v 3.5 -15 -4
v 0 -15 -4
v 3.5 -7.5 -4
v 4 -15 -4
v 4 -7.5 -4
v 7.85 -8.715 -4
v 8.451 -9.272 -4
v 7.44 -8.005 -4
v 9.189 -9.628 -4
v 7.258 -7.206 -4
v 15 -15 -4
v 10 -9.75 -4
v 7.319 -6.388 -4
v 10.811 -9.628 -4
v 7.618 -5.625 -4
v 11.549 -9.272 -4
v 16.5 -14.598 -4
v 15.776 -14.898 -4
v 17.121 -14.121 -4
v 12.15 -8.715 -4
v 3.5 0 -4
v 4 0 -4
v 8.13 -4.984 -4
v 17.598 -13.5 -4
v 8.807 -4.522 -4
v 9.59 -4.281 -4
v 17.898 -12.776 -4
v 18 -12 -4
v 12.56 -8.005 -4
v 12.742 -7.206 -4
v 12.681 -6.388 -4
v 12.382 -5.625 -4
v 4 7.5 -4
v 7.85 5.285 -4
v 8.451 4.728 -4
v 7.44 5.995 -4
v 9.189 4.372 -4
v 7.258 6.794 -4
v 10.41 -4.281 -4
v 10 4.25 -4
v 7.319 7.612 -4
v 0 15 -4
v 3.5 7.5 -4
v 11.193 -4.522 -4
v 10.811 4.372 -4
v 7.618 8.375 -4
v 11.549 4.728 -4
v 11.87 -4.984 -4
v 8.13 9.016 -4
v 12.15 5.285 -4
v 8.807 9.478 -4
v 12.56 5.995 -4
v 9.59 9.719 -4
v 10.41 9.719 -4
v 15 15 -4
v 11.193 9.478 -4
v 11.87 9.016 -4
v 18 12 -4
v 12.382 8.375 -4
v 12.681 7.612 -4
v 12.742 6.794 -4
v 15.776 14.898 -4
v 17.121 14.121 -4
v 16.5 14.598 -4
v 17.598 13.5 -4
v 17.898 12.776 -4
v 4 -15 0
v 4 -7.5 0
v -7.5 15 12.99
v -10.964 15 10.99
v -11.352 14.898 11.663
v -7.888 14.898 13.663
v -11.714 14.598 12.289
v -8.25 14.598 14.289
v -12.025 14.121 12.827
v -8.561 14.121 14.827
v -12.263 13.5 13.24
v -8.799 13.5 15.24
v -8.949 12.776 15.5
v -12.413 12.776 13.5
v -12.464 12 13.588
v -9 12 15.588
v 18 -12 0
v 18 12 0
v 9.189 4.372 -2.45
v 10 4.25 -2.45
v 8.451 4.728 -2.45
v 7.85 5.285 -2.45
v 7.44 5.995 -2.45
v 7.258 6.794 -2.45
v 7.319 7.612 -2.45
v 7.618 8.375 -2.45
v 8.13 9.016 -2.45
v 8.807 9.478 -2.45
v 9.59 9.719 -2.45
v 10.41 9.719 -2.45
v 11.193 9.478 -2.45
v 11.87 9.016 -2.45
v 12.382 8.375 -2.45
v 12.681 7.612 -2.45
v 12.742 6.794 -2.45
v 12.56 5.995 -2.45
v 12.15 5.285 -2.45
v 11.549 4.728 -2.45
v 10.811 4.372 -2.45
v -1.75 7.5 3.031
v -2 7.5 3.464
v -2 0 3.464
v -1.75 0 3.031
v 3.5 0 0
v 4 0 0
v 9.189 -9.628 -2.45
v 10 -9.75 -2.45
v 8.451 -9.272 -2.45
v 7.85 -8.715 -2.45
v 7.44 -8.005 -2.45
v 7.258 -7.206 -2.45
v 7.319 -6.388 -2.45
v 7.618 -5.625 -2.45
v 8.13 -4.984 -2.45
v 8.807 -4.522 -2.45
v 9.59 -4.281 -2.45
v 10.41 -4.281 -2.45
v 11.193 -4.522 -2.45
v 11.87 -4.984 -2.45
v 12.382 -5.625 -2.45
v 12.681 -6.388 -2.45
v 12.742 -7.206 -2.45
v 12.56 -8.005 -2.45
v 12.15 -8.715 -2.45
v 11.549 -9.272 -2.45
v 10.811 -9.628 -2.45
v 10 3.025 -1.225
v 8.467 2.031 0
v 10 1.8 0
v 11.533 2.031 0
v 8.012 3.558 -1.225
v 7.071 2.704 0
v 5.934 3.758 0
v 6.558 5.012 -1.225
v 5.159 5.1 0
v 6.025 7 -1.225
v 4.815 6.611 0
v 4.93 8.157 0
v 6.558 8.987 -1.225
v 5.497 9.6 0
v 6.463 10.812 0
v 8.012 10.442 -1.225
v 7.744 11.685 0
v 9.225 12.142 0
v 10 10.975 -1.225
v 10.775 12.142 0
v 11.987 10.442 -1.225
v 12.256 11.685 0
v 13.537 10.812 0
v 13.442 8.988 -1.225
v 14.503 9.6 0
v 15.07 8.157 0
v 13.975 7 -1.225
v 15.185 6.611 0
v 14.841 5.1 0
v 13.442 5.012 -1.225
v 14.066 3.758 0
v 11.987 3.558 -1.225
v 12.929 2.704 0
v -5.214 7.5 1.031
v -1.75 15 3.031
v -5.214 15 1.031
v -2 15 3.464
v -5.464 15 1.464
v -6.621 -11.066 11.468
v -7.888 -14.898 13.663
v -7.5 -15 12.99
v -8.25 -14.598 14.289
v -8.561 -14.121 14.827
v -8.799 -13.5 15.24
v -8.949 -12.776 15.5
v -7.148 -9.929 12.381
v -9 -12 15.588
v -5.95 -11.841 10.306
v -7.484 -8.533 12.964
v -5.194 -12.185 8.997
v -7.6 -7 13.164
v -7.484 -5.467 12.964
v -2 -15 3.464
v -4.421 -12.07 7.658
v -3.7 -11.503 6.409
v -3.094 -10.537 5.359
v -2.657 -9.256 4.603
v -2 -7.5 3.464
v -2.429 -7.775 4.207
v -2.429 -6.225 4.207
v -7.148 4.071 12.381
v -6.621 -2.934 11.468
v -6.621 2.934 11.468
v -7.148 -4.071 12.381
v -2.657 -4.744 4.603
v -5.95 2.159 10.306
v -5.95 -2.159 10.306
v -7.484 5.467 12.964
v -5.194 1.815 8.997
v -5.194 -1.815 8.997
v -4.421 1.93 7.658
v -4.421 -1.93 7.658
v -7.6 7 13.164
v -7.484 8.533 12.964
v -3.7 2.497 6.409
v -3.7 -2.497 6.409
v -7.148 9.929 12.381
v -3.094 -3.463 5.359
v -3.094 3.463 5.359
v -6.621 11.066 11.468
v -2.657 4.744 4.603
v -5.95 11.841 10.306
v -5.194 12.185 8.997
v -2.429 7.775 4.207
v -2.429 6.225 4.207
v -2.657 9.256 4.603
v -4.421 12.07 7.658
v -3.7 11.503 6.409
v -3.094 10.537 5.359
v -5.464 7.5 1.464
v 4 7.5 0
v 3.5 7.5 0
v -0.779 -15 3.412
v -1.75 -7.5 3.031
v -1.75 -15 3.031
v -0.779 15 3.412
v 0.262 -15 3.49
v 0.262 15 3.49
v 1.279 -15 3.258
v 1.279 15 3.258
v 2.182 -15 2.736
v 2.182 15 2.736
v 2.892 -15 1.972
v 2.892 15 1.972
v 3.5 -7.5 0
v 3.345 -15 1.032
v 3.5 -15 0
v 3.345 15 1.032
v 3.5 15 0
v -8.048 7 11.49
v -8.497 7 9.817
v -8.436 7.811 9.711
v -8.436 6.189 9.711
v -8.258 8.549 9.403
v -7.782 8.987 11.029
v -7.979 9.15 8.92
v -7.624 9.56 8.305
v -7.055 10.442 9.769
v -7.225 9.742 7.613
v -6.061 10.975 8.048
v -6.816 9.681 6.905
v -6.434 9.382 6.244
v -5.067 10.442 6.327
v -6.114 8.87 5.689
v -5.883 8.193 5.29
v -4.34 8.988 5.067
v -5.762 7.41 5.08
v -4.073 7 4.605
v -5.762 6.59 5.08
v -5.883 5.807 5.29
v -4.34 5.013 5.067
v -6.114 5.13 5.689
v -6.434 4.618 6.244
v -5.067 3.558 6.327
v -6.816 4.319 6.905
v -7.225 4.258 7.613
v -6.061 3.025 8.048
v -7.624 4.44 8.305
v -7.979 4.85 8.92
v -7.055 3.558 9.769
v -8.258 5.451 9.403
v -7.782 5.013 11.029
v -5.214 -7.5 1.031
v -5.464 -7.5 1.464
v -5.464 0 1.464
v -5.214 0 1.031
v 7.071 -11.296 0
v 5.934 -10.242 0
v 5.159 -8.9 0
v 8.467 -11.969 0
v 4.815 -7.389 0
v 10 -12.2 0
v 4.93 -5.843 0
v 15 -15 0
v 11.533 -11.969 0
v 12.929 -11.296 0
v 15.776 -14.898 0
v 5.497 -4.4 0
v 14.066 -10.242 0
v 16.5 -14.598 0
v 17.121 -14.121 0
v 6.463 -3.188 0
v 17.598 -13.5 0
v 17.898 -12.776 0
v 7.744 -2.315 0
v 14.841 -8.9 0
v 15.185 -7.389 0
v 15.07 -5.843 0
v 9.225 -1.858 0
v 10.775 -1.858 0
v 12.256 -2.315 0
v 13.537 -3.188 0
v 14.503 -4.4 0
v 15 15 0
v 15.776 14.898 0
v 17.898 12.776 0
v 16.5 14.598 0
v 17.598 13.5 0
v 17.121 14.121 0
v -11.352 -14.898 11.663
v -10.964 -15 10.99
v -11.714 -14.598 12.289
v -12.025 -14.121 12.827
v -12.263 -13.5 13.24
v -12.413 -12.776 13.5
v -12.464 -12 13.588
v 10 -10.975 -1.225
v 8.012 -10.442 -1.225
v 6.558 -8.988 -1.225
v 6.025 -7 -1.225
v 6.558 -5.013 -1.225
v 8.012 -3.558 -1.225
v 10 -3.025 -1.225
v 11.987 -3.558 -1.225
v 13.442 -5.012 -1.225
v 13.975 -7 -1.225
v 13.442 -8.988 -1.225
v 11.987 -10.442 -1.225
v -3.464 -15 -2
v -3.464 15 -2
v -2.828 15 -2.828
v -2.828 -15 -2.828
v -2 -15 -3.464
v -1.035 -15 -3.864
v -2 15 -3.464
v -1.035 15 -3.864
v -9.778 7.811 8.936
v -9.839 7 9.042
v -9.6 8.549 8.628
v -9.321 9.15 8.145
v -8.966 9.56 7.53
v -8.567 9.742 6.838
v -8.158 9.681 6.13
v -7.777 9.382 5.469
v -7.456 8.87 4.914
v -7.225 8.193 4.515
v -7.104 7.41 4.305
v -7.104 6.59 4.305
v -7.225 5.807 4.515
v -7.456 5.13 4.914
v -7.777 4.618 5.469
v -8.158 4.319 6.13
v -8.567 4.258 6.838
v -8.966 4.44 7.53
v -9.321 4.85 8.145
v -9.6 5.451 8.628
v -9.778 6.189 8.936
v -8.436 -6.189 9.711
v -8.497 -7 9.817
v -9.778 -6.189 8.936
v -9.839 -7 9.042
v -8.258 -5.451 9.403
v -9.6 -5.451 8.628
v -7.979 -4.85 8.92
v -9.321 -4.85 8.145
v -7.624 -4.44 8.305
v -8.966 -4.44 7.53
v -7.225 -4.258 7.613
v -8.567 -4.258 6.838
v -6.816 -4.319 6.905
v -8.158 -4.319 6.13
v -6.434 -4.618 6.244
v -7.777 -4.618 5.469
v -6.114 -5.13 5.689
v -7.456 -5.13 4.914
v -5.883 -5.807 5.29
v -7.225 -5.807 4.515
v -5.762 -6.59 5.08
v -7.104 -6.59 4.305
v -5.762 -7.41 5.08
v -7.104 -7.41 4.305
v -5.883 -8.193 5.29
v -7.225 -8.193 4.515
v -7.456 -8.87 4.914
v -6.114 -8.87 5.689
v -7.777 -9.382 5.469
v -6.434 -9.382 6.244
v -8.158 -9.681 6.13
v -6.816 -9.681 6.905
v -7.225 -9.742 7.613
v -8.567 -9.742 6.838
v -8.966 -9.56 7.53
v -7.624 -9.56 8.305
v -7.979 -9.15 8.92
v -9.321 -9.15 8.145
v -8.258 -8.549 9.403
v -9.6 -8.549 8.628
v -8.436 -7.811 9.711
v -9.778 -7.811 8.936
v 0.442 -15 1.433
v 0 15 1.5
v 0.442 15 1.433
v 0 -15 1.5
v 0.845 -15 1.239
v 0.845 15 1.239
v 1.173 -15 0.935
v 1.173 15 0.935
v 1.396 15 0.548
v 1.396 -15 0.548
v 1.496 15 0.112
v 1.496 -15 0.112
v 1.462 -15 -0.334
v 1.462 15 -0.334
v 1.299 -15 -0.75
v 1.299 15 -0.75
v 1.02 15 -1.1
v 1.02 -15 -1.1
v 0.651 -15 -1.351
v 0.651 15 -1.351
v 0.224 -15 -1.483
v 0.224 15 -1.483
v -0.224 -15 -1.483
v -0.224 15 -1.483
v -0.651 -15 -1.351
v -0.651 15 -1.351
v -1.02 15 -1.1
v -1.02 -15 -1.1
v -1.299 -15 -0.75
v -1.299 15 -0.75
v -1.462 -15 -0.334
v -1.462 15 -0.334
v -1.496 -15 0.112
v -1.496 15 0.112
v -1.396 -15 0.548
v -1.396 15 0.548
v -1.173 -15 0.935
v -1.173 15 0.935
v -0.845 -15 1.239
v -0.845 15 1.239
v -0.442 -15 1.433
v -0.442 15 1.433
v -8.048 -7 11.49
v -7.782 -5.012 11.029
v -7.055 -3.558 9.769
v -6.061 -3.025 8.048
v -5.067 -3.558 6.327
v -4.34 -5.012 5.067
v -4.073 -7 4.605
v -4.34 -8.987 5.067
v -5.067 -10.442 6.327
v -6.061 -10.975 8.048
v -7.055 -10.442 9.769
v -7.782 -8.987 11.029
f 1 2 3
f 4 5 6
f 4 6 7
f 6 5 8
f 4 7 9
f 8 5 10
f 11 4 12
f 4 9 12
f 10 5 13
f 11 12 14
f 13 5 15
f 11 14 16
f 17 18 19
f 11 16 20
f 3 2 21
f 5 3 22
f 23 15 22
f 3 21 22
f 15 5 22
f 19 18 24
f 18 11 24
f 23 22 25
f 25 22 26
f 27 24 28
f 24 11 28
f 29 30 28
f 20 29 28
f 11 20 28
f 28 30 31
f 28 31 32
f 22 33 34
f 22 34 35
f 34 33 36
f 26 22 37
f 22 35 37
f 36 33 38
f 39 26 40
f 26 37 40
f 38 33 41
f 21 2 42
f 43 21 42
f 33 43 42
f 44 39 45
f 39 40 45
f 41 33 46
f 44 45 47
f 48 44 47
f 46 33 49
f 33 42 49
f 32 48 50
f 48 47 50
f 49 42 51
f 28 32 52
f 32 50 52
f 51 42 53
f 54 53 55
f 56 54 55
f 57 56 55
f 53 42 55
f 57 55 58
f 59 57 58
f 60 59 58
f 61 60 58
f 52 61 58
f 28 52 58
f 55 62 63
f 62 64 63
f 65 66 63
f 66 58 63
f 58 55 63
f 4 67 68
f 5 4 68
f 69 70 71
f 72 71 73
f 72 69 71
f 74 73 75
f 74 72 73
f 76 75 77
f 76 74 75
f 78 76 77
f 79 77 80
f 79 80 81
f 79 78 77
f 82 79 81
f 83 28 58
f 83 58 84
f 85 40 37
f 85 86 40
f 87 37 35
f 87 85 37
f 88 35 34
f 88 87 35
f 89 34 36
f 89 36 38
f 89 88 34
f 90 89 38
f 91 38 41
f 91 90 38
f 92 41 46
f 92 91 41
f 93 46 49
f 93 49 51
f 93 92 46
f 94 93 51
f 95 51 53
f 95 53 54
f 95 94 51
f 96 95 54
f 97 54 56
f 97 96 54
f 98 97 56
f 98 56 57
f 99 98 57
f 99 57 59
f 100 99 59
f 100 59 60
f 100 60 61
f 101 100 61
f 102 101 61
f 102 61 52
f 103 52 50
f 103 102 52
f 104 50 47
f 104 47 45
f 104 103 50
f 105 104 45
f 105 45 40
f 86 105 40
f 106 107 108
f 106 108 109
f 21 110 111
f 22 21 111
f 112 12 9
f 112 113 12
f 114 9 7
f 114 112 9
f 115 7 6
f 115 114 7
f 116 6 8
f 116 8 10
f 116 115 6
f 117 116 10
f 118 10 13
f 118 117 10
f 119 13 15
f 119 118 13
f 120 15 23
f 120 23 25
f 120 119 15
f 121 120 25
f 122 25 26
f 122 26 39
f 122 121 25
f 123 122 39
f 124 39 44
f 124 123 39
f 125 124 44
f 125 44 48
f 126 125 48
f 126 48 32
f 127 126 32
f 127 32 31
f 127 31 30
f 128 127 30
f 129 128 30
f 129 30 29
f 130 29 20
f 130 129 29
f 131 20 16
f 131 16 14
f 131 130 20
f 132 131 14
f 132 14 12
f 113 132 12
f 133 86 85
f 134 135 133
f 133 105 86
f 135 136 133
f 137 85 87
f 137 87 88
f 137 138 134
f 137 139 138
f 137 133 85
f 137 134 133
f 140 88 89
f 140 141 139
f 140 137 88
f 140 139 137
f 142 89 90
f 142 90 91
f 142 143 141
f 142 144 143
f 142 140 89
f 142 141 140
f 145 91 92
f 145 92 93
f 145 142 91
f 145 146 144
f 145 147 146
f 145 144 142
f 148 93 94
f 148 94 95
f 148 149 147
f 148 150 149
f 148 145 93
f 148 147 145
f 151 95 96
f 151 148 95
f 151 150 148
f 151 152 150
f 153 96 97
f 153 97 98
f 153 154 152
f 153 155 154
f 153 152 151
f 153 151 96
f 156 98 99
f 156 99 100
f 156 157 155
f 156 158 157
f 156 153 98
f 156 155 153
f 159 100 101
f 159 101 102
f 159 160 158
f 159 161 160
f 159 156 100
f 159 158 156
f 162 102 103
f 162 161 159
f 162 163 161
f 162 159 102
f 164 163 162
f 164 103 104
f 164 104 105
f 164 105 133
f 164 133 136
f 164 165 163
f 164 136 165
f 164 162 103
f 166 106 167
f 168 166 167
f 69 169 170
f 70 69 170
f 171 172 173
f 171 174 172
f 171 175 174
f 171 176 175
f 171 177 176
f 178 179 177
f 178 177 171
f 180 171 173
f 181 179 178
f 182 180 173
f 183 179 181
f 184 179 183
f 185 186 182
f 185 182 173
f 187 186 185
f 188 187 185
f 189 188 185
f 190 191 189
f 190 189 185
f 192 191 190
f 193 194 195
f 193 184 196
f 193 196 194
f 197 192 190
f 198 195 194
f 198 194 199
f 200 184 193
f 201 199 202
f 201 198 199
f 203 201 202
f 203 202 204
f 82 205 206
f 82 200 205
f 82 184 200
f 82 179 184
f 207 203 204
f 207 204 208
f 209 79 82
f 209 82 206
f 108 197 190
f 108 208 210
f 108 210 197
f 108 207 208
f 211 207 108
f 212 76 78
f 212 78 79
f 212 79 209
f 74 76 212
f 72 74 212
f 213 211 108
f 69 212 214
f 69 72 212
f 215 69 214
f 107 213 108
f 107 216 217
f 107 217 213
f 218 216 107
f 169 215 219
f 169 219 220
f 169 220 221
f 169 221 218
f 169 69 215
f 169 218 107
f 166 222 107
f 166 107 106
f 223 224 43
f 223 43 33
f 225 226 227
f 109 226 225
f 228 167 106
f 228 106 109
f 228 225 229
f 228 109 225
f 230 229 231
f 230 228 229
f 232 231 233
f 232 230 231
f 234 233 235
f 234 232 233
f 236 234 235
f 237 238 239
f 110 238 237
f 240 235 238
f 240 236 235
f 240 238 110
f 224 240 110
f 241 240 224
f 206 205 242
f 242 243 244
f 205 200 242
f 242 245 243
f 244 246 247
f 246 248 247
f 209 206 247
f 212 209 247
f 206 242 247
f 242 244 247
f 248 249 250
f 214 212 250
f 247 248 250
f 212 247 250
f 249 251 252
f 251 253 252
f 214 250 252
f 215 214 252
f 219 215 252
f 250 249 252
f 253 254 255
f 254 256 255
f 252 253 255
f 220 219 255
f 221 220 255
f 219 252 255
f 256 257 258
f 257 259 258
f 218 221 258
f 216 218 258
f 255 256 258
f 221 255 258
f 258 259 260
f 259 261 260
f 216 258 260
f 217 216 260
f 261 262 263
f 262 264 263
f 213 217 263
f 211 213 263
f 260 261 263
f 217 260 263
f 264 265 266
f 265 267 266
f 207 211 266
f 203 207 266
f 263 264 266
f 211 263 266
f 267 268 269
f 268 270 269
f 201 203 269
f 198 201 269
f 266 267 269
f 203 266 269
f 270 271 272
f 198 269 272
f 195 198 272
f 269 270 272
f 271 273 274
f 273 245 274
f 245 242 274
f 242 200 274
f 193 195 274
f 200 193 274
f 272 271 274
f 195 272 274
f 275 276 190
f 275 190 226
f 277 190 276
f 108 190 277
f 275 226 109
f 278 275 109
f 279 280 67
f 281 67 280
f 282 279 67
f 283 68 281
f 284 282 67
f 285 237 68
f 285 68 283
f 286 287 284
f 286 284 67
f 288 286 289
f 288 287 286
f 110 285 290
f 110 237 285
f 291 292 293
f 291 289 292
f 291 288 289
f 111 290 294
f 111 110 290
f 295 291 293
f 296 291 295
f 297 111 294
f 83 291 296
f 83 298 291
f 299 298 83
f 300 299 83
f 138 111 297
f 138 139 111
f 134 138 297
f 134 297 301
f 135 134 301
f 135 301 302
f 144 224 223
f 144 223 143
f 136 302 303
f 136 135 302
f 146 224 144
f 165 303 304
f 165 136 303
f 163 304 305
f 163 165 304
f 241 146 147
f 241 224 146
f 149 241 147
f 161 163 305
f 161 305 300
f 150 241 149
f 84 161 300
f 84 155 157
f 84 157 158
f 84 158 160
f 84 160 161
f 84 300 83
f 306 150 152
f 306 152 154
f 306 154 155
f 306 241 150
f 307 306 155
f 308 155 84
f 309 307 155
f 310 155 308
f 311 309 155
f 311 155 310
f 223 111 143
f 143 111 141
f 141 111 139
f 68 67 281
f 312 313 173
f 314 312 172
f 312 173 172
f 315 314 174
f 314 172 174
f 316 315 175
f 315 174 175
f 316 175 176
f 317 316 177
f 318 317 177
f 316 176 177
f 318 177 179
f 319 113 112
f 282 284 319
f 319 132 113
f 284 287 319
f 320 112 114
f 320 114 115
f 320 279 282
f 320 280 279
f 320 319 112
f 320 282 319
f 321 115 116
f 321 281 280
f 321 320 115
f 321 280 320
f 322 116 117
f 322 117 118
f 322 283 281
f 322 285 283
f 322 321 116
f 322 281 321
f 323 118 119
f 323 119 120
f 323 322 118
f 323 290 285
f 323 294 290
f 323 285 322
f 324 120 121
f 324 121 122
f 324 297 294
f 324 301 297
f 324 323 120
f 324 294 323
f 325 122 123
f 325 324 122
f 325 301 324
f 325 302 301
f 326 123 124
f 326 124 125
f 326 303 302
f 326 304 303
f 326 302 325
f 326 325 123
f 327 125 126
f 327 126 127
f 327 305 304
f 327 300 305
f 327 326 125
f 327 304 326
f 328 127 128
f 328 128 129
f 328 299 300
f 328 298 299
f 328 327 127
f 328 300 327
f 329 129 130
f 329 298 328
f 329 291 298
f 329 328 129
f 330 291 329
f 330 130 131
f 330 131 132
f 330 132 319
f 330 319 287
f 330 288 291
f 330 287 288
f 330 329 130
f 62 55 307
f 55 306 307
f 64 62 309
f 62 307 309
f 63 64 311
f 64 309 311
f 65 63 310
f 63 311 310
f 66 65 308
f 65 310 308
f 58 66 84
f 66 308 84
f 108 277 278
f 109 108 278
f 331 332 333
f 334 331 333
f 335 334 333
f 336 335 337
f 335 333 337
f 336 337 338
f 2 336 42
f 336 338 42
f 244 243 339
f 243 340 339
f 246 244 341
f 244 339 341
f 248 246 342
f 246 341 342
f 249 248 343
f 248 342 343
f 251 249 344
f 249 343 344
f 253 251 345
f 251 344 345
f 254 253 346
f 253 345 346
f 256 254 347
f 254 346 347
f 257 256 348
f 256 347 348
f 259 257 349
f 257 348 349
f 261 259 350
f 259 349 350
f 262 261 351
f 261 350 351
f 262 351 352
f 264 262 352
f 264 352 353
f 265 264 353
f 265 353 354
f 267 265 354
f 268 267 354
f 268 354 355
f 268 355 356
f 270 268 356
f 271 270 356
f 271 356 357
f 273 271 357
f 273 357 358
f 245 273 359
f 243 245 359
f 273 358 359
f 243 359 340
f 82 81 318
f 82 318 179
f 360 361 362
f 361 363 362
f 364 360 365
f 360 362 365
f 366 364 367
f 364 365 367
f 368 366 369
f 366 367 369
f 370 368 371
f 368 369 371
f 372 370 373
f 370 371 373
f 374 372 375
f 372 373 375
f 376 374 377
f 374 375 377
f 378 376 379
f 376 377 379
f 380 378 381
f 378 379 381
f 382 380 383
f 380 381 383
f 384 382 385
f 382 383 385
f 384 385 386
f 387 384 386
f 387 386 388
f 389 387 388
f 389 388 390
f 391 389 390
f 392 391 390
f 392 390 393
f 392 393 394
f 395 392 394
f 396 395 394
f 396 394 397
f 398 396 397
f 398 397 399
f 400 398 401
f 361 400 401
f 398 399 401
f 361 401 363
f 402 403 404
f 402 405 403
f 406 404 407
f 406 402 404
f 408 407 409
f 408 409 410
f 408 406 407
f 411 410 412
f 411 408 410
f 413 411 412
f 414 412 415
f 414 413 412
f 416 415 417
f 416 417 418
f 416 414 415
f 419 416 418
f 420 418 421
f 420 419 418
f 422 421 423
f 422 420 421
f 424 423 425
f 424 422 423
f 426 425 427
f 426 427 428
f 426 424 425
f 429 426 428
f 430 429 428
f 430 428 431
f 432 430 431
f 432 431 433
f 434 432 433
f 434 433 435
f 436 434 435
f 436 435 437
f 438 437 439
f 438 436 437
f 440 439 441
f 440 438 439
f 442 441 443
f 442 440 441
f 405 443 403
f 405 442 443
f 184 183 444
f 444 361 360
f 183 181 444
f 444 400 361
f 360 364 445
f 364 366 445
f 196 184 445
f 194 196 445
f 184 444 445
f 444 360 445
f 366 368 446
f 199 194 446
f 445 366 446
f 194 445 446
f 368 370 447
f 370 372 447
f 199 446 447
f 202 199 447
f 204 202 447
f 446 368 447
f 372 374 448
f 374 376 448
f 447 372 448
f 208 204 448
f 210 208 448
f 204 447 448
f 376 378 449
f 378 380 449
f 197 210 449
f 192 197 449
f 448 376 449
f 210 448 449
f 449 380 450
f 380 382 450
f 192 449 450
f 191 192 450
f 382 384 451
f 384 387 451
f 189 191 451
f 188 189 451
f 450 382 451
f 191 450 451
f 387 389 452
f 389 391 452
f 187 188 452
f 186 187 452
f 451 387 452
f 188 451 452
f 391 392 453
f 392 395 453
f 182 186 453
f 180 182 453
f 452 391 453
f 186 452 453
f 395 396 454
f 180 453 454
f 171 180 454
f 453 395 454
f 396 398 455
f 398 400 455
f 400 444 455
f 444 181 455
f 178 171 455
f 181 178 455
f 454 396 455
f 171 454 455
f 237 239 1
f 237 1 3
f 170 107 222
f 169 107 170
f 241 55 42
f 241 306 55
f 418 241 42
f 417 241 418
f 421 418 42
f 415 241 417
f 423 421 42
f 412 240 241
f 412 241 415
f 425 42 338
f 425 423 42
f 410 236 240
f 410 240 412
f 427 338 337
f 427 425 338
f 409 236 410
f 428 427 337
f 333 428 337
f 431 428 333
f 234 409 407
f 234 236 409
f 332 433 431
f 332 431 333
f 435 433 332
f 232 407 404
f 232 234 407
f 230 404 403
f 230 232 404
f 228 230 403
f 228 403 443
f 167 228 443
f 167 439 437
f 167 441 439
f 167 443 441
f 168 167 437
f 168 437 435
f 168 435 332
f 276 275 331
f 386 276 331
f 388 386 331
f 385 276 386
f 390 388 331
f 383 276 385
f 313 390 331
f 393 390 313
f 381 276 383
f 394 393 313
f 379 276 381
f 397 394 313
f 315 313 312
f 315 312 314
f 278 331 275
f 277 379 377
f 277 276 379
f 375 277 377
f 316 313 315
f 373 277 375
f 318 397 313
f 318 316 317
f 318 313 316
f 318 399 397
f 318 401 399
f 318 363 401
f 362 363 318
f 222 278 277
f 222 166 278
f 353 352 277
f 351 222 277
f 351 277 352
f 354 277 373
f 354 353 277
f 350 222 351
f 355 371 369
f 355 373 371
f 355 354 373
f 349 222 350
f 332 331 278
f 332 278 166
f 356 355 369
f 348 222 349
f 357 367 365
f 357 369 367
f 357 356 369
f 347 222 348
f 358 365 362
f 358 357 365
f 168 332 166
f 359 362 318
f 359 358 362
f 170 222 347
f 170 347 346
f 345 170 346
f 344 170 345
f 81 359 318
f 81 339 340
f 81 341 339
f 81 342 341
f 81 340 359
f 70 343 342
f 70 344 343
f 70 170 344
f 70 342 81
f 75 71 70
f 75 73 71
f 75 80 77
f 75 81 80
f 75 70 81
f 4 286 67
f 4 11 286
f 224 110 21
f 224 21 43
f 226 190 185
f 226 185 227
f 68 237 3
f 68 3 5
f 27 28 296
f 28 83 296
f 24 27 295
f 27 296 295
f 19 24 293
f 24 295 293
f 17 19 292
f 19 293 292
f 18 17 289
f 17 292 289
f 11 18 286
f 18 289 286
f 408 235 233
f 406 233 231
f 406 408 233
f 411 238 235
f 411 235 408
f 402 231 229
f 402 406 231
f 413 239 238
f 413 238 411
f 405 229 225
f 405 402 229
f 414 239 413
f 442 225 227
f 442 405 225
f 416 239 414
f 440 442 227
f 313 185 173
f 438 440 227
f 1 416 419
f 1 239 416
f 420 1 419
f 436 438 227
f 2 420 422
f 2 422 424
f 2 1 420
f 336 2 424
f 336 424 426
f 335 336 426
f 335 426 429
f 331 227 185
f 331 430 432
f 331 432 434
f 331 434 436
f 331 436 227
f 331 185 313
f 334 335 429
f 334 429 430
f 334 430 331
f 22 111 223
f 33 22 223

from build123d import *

# Parameters (mm, degrees)
SKETCH_9_R                  = 1.5
EXTRUDE_4_DEPTH             = 15
EXTRUDE_4_DEPTH_BACK        = 15
EXTRUDE_5_REACH             = 17
SKETCH_10_R                 = 1.5
EXTRUDE_5_DIRECTION_2_REACH = 17
HOLE_WIZARD_M52_AT_2_COUNT  = 2
HOLE_WIZARD_M52_AT_2_PITCH  = 14
HOLE_WIZARD_M51_D           = 5.5
HOLE_WIZARD_M51_CSINK_D     = 10.4
HOLE_WIZARD_M51_CSINK_ANGLE = 90
CUT_EXTRUDE_3_DEPTH         = 16
CUT_EXTRUDE_3_DEPTH_BACK    = 16
SKETCH_25_W                 = 0.5
SKETCH_25_H                 = 7.5
CUT_EXTRUDE_7_DEPTH         = 13.794228634
SKETCH_27_W                 = 0.5
SKETCH_27_H                 = 7.5
CUT_EXTRUDE_8_DEPTH         = 5
FILLET_4_R                  = 3


with BuildPart() as part:
    # Sketch 9 → Extrude 4 (new body, two sides)
    with BuildSketch(Plane(origin=(0, 0, 0), x_dir=(1, 0, 0), z_dir=(0, 1, 0))) as extrude_4_sk:
        with BuildLine():
            Line((0, 4), (18, 4))
            Line((18, 4), (18, 0))
            Line((18, 0), (4, 0))
            ThreePointArc((4, 0), (-2.828427125, -2.828427125), (0, 4))
        make_face()
        with Locations(Location((0, 0, 0), (0, 0, 270))):  # turned: the seam where the file's is
            Circle(SKETCH_9_R, mode=Mode.SUBTRACT)
    extrude(amount=EXTRUDE_4_DEPTH)
    extrude(extrude_4_sk.sketch, amount=-EXTRUDE_4_DEPTH_BACK)

    # Extrude 5: up to this face of the body (flat: up to its plane)
    extrude_5_end = Plane(part.part.faces().sort_by_distance((6.10604541, 15, -1.19522591))[0])
    # Sketch 10 → Extrude 5 (add, up to the picked face)
    with BuildSketch(Plane(origin=(0, 0, 0), x_dir=(1, 0, 0), z_dir=(0, 1, 0)), mode=Mode.PRIVATE) as extrude_5_sk1:
        with BuildLine():
            Line((-3.464101615, 2), (-12.464101615, -13.588457268))
            Line((-12.464101615, -13.588457268), (-9, -15.588457268))
            Line((-9, -15.588457268), (-2, -3.464101615))
            ThreePointArc((-2, -3.464101615), (3.863703305, 1.03527618), (-3.464101615, 2))
        make_face()
        with Locations(Location((0, 0, 0), (0, 0, 270))):  # turned: the seam where the file's is
            Circle(SKETCH_10_R, mode=Mode.SUBTRACT)
    extrude_5_tool1 = split(extrude(extrude_5_sk1.sketch, amount=EXTRUDE_5_REACH, mode=Mode.PRIVATE), bisect_by=extrude_5_end, keep=Keep.BOTH, mode=Mode.PRIVATE)
    add(extrude_5_tool1.solids().sort_by(Axis((-4.088119, 0, 4.690377), (0, 1, 0)))[0])

    # Extrude 5 direction 2: up to this face of the body (flat: up to its plane)
    extrude_5_direction_2_end = Plane(part.part.faces().sort_by_distance((6.10604541, -15, -1.19522591))[0])
    # Sketch 10 → Extrude 5 direction 2 (add, up to the picked face)
    with BuildSketch(Plane(origin=(0, 0, 0), x_dir=(1, 0, 0), z_dir=(0, 1, 0)), mode=Mode.PRIVATE) as extrude_5_direction_2_sk1:
        with BuildLine():
            Line((-3.464101615, 2), (-12.464101615, -13.588457268))
            Line((-12.464101615, -13.588457268), (-9, -15.588457268))
            Line((-9, -15.588457268), (-2, -3.464101615))
            ThreePointArc((-2, -3.464101615), (3.863703305, 1.03527618), (-3.464101615, 2))
        make_face()
        with Locations(Location((0, 0, 0), (0, 0, 270))):  # turned: the seam where the file's is
            Circle(SKETCH_10_R, mode=Mode.SUBTRACT)
    extrude_5_direction_2_tool1 = split(extrude(extrude_5_direction_2_sk1.sketch, amount=-EXTRUDE_5_DIRECTION_2_REACH, mode=Mode.PRIVATE), bisect_by=extrude_5_direction_2_end, keep=Keep.BOTH, mode=Mode.PRIVATE)
    add(extrude_5_direction_2_tool1.solids().sort_by(Axis((-4.088119, 0, 4.690377), (0, -1, 0)))[0])

    # Sketch 12 → Hole Wizard M52 (revolve, cut)
    with BuildSketch(Plane(origin=(10, 7, 0), x_dir=(0, -1, 0), z_dir=(1, 0, 0))):
        Polygon((0, 0), (0, 4), (2.75, 4), (2.75, 2.45), (5.2, 0), align=None)
    hole_wizard_m52 = revolve(axis=Axis((10, 7, 6.35), (0, 0, -1)), mode=Mode.SUBTRACT)

    # Hole Wizard M52 at 2: Hole Wizard M52 ×2
    with Locations(*[(0, -i * HOLE_WIZARD_M52_AT_2_PITCH, 0) for i in range(1, HOLE_WIZARD_M52_AT_2_COUNT)]):
        add(hole_wizard_m52, mode=Mode.SUBTRACT)

    # Hole Wizard M51 (through all)
    with Locations(Plane(origin=(0, 0, 0), x_dir=(0.5, 0, -0.866025404), z_dir=(0.866025404, 0, 0.5))):
        with Locations((-10, 7), (-10, -7)):
            CounterSinkHole(HOLE_WIZARD_M51_D / 2, HOLE_WIZARD_M51_CSINK_D / 2, counter_sink_angle=HOLE_WIZARD_M51_CSINK_ANGLE)

    # Sketch 17 → Cut-Extrude 3 (cut, two sides)
    with BuildSketch(Plane(origin=(0, 0, 0), x_dir=(1, 0, 0), z_dir=(0, 1, 0))) as cut_extrude_3_sk:
        with BuildLine():
            Line((-2, -3.464101615), (-1.75, -3.031088913))
            ThreePointArc((-1.75, -3.031088913), (1.75, -3.031088913), (3.5, 0))
            Line((3.5, 0), (4, 0))
            ThreePointArc((4, 0), (2, -3.464101615), (-2, -3.464101615))
        make_face()
    extrude(amount=CUT_EXTRUDE_3_DEPTH, mode=Mode.SUBTRACT)
    extrude(cut_extrude_3_sk.sketch, amount=-CUT_EXTRUDE_3_DEPTH_BACK, mode=Mode.SUBTRACT)

    # Sketch 25 → Cut-Extrude 7 (cut, through all)
    with BuildSketch(Plane(origin=(0, 0, 0), x_dir=(0.5, 0, -0.866025404), z_dir=(0.866025404, 0, 0.5))):
        with Locations((-3.75, 11.25)):
            Rectangle(SKETCH_25_W, SKETCH_25_H)
        with Locations((-3.75, -3.75)):
            Rectangle(SKETCH_25_W, SKETCH_25_H)
    extrude(amount=-CUT_EXTRUDE_7_DEPTH, mode=Mode.SUBTRACT)

    # Sketch 27 → Cut-Extrude 8 (cut, through all)
    with BuildSketch(Plane.XY):
        with Locations((3.75, 3.75)):
            Rectangle(SKETCH_27_W, SKETCH_27_H)
        with Locations((3.75, -11.25)):
            Rectangle(SKETCH_27_W, SKETCH_27_H)
    extrude(amount=-CUT_EXTRUDE_8_DEPTH, mode=Mode.SUBTRACT)

    # Fillet 4
    fillet_4_edges = [part.edges().sort_by_distance(p)[0] for p in [
        (18, -15, -2),
        (18, 15, -2),
        (-10.732050808, 15, 14.588457268),
        (-10.732050808, -15, 14.588457268),
    ]]
    fillet(fillet_4_edges, radius=FILLET_4_R)


solid = part.part
